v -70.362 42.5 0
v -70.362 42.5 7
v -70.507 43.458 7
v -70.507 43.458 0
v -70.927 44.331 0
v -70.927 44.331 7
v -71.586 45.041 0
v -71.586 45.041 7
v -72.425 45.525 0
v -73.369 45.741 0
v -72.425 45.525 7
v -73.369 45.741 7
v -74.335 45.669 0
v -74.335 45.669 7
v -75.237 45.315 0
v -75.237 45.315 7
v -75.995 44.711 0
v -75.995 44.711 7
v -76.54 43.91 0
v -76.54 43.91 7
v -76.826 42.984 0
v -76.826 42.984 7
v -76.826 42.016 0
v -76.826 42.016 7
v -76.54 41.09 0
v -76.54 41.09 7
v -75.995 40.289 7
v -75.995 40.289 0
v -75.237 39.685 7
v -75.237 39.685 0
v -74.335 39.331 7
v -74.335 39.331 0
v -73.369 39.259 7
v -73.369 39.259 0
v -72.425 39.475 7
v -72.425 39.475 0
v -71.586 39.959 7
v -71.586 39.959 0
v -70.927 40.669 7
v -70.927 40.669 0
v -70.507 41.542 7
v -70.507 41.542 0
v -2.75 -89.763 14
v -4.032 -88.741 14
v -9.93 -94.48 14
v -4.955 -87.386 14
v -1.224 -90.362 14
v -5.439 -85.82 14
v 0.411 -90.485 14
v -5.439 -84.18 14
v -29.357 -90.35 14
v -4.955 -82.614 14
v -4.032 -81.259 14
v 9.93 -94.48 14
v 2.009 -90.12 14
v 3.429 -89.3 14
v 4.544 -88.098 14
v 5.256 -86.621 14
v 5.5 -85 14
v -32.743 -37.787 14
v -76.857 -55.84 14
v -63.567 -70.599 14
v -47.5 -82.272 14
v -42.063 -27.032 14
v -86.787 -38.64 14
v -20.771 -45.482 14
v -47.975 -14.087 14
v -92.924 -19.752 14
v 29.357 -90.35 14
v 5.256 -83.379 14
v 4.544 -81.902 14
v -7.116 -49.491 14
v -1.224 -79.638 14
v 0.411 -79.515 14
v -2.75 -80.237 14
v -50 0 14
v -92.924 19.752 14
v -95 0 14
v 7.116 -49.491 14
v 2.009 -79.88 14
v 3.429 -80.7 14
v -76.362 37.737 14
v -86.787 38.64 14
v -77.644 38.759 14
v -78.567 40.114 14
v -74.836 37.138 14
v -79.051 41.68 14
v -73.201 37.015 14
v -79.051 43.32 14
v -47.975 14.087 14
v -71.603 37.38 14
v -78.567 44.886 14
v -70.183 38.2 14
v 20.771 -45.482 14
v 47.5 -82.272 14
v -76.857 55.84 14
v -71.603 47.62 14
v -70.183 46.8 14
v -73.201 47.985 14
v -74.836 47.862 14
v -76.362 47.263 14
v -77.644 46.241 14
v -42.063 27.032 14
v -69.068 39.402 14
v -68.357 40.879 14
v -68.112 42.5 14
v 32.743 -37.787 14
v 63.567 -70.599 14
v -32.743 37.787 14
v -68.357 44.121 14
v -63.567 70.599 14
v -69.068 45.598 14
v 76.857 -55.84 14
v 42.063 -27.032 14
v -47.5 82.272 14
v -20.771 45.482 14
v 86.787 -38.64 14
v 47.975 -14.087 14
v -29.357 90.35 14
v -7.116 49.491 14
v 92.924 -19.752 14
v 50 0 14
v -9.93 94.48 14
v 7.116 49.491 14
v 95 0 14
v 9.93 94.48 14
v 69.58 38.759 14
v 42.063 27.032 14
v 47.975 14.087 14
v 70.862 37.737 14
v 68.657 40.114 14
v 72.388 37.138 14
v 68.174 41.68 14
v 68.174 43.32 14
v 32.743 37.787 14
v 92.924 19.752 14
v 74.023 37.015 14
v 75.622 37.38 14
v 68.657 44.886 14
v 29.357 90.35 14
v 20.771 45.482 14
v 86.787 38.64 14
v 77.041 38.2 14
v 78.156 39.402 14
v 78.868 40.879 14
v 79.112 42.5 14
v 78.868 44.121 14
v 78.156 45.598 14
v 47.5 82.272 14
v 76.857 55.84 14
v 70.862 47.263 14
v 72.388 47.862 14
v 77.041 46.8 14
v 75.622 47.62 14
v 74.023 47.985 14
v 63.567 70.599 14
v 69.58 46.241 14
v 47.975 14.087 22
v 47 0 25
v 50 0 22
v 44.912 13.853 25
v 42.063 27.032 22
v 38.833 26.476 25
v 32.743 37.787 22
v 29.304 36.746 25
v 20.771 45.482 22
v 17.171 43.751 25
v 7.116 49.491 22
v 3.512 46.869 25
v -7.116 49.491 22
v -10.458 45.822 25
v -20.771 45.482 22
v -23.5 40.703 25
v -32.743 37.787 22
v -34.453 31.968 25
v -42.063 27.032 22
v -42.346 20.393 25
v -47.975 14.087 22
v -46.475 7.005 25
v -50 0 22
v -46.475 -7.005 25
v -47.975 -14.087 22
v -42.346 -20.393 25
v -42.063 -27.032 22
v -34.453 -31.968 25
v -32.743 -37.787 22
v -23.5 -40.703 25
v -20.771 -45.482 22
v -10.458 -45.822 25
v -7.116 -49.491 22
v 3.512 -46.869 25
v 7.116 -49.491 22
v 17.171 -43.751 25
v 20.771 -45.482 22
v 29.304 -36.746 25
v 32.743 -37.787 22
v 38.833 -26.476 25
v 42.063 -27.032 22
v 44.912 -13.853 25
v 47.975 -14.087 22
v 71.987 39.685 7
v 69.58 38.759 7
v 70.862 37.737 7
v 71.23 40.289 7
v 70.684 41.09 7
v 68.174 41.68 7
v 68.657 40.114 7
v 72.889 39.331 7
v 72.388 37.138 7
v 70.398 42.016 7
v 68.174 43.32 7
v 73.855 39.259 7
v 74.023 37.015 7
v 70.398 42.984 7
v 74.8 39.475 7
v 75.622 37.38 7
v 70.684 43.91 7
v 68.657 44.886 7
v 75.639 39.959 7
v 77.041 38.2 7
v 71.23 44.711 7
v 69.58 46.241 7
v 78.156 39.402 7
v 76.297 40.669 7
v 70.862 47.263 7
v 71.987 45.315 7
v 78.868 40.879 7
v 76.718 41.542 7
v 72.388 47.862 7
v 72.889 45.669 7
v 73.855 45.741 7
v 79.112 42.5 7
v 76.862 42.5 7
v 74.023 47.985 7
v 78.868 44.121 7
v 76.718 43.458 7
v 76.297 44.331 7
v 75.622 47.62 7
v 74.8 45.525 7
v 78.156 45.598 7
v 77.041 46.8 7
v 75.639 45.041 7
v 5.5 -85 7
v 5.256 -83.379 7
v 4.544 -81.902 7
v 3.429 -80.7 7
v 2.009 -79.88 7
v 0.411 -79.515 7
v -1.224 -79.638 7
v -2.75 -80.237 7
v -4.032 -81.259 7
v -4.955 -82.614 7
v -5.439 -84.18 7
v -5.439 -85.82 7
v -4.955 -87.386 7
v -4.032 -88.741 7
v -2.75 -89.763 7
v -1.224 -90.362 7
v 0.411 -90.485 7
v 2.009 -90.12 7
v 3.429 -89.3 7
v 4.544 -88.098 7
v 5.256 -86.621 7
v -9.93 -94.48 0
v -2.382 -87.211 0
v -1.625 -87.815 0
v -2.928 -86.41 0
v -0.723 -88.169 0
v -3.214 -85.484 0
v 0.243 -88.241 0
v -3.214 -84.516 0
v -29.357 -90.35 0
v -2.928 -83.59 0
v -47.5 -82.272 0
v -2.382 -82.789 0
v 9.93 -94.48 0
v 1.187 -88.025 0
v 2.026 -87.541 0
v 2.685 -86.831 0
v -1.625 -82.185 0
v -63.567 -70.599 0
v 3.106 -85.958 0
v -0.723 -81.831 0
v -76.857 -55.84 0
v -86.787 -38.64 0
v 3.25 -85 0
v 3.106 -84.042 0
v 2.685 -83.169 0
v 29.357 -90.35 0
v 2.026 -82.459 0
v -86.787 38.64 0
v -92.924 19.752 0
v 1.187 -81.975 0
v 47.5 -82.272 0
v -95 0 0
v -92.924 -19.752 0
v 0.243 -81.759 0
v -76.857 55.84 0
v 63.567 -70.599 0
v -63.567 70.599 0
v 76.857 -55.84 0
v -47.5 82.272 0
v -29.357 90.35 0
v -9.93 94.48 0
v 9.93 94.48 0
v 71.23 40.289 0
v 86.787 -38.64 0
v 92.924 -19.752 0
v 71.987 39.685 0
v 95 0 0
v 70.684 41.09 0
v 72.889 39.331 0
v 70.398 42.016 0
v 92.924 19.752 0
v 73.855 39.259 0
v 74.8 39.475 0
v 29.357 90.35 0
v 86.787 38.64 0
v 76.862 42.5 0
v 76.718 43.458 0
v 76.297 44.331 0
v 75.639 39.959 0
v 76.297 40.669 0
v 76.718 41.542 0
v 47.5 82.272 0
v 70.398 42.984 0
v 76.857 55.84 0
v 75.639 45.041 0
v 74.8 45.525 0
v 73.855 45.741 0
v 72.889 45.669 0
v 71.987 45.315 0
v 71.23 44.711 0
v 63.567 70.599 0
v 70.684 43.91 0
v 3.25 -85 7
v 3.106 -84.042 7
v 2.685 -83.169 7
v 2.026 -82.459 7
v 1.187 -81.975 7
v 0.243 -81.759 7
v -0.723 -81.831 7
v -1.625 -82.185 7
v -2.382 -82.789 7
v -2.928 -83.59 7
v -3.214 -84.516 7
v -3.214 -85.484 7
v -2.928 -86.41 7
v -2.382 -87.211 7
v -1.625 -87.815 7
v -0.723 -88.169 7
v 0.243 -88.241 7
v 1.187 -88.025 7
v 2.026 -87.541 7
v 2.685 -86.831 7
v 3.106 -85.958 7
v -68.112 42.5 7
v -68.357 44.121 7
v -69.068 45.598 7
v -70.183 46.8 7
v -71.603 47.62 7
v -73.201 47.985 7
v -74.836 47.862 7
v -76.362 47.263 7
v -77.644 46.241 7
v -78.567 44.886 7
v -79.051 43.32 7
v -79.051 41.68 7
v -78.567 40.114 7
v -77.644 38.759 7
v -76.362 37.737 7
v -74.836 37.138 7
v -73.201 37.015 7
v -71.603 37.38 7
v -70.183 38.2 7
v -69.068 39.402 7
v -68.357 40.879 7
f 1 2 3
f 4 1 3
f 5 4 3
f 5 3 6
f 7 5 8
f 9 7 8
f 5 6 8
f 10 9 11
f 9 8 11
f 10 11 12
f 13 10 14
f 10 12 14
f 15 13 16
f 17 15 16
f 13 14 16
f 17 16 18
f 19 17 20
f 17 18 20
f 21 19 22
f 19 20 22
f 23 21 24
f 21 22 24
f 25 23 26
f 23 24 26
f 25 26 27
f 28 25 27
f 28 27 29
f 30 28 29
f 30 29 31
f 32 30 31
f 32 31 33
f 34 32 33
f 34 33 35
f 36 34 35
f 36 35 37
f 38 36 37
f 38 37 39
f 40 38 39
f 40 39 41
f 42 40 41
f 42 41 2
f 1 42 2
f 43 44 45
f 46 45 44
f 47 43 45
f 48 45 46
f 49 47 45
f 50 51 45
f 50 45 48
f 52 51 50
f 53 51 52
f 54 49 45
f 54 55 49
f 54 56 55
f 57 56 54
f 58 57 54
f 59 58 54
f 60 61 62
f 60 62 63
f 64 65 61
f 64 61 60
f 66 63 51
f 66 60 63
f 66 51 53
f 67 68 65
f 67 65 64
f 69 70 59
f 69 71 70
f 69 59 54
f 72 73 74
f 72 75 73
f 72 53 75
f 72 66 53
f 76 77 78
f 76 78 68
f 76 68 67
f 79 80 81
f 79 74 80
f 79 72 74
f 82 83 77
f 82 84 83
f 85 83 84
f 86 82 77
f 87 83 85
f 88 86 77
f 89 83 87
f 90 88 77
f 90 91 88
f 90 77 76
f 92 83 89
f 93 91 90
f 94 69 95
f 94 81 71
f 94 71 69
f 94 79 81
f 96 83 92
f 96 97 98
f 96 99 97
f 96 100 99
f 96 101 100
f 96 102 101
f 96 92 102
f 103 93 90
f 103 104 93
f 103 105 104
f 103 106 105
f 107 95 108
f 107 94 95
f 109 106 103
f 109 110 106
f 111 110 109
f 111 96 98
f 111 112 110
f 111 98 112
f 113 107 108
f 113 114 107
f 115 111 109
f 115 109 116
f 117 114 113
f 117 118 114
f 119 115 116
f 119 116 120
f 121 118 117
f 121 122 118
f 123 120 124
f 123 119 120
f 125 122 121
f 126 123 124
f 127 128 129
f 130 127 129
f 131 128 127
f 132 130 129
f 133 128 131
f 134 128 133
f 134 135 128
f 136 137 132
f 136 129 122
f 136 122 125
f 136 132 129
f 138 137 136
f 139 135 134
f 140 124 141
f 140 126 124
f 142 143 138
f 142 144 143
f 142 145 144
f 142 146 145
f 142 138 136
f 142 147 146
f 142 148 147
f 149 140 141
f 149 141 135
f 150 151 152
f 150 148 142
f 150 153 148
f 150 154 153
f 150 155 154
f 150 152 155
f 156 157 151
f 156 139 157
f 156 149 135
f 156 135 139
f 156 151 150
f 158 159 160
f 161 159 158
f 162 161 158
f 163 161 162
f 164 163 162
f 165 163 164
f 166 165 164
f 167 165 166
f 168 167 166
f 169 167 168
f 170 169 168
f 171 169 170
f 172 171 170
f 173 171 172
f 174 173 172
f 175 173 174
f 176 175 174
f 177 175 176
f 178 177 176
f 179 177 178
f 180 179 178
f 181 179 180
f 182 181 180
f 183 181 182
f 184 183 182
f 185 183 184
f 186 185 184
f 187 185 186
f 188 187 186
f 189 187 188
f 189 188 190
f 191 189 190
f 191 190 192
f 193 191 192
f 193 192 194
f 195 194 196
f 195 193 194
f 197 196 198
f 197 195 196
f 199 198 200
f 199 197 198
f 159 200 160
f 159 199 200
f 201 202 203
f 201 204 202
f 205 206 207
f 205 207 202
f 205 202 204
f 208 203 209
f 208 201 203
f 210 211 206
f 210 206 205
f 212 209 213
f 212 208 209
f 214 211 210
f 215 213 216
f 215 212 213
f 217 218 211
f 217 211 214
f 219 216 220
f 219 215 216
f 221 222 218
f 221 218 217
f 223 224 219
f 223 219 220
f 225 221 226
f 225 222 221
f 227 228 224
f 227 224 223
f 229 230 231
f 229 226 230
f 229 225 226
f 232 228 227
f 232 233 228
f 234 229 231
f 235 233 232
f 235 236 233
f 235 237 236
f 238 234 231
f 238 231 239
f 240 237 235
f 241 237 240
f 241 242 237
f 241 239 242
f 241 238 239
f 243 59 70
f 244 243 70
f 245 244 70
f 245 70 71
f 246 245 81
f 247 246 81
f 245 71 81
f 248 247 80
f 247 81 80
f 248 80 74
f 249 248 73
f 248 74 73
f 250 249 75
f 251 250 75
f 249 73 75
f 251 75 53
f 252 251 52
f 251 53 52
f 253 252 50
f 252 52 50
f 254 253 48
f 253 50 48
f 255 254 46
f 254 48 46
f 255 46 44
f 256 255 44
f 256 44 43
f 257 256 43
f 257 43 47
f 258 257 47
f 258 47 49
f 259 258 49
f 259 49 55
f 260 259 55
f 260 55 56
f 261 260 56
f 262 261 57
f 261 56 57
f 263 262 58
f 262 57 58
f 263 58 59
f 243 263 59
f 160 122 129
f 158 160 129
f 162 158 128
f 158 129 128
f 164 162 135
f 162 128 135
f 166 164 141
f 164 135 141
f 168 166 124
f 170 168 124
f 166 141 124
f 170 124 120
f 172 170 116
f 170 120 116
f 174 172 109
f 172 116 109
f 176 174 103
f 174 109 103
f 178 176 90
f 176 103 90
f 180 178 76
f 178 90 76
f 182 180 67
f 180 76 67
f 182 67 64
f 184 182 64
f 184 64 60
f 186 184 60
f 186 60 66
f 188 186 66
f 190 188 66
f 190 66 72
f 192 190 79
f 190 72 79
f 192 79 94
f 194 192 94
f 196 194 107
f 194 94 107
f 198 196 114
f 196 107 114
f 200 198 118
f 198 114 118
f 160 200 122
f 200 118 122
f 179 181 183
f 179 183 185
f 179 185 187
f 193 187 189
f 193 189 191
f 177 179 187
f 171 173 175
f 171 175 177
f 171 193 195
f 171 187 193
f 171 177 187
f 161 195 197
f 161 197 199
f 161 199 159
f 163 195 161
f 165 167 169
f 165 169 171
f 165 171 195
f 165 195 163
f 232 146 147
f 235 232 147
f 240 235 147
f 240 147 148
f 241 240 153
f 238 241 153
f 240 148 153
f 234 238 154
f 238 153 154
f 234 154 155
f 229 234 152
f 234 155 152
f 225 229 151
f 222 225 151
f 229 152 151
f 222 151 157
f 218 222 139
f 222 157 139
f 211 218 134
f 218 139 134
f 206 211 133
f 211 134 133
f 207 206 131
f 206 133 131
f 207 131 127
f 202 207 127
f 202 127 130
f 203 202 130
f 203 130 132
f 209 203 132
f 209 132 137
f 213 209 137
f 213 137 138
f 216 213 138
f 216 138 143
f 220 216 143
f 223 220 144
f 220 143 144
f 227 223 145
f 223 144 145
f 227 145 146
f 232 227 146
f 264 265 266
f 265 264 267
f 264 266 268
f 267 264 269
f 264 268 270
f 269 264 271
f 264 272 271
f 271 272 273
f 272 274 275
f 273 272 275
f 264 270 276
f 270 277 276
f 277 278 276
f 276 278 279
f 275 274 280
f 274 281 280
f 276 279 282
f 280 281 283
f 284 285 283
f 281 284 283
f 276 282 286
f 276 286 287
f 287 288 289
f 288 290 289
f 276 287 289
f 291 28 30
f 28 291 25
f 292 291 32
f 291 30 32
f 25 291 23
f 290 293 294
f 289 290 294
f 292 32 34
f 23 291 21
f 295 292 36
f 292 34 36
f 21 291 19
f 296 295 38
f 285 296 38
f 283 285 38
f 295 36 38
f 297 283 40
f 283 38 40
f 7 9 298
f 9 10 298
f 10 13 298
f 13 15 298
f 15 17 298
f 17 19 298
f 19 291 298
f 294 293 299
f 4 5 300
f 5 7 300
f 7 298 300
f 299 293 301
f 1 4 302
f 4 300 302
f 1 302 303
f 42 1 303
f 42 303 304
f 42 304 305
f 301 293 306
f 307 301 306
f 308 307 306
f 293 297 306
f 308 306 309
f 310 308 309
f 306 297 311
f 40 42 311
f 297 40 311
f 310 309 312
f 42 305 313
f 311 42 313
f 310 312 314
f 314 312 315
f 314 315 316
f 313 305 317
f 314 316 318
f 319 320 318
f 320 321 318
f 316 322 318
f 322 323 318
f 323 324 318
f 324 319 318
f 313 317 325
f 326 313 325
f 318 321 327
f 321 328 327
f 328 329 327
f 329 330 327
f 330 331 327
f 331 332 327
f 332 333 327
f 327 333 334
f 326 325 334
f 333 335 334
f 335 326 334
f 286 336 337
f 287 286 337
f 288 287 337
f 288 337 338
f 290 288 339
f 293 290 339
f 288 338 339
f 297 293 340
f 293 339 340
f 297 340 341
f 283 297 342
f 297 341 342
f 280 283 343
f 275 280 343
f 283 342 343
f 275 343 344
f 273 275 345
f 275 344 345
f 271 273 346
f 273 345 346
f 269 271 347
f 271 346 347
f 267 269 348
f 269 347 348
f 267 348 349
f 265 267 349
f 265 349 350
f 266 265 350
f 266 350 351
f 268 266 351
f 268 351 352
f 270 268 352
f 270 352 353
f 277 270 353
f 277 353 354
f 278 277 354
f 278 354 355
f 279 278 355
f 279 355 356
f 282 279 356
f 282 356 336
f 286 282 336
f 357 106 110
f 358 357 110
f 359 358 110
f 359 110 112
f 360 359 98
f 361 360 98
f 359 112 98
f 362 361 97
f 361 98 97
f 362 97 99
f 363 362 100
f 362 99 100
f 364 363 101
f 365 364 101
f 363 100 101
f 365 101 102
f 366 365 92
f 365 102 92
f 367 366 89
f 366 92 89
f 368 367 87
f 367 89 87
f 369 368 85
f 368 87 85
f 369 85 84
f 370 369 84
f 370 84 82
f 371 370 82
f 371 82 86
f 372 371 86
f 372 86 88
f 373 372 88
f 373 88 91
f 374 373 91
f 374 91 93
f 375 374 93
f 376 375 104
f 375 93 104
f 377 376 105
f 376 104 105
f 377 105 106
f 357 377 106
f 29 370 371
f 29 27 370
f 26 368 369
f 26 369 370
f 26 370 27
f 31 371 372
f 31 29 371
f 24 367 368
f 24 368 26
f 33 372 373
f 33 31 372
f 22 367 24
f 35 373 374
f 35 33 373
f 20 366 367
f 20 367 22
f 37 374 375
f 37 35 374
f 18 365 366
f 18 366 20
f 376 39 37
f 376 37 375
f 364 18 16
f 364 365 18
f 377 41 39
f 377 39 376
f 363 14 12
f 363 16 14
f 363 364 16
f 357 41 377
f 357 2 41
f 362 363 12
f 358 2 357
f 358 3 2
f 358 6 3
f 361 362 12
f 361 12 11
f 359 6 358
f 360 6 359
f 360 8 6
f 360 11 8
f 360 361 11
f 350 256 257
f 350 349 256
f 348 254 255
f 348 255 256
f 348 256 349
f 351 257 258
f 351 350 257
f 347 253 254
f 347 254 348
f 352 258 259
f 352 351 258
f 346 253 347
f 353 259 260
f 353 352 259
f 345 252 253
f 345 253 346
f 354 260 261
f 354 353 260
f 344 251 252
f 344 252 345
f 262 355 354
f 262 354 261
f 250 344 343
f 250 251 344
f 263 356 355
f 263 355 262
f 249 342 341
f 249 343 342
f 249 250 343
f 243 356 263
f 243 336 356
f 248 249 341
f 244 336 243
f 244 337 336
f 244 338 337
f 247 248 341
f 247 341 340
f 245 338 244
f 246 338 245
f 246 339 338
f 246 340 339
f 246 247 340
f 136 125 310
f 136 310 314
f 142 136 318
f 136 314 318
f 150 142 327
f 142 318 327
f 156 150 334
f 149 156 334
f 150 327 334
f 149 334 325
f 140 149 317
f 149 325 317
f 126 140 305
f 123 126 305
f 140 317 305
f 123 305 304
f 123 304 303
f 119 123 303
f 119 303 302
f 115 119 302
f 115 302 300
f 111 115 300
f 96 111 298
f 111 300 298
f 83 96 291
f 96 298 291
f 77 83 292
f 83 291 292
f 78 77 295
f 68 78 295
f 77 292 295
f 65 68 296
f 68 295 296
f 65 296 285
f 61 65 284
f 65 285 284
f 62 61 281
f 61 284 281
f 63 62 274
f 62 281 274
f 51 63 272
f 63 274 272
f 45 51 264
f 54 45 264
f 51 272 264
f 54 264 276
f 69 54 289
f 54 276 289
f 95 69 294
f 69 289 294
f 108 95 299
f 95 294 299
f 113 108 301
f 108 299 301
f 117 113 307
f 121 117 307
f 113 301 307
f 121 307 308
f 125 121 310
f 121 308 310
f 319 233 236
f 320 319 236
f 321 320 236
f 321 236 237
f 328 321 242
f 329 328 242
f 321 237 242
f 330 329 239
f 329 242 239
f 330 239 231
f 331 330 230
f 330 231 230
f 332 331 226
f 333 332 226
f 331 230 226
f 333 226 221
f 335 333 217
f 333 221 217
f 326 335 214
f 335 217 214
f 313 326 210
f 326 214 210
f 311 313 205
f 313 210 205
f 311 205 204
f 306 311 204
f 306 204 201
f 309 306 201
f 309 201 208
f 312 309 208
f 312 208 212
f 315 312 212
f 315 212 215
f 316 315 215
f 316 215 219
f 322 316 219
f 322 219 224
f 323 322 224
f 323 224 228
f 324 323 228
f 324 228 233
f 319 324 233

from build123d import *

# Parameters (mm, degrees)
F0_R     = 95
F1_DEPTH = 14
F2_R     = 50
F3_DEPTH = 11
F4_SIZE  = 3
F5_R     = 5.5
F6_DEPTH = 7
F7_R     = 3.25
F8_DEPTH = 25


with BuildPart() as f1:
    # F0 (on Top) → F1 (new body)
    with BuildSketch(Plane.XY):
        Circle(F0_R)
    extrude(amount=F1_DEPTH)

    # F2 (on face) → F3 (join)
    with BuildSketch(Plane.XY.offset(14)):
        Circle(F2_R)
    extrude(amount=F3_DEPTH)

    # F4
    f4_edges = [f1.edges().sort_by_distance(p)[0] for p in [
        (-50, 0, 25),
    ]]
    chamfer(f4_edges, length=F4_SIZE)

    # F5 (on face) → F6 (cut)
    with BuildSketch(Plane.XY.offset(14)):
        with Locations((0, -85)):
            Circle(F5_R)
        with Locations((-73.612159, 42.5)):
            Circle(F5_R)
        with Locations((73.612159, 42.5)):
            Circle(F5_R)
    extrude(amount=-F6_DEPTH, mode=Mode.SUBTRACT)

    # F7 (on face) → F8 (cut)
    with BuildSketch(Plane.XY.offset(7)):
        with Locations((0, -85)):
            Circle(F7_R)
        with Locations((73.612159, 42.5)):
            Circle(F7_R)
        with Locations((-73.612159, 42.5)):
            Circle(F7_R)
    extrude(amount=-F8_DEPTH, mode=Mode.SUBTRACT)


solid = f1.part
